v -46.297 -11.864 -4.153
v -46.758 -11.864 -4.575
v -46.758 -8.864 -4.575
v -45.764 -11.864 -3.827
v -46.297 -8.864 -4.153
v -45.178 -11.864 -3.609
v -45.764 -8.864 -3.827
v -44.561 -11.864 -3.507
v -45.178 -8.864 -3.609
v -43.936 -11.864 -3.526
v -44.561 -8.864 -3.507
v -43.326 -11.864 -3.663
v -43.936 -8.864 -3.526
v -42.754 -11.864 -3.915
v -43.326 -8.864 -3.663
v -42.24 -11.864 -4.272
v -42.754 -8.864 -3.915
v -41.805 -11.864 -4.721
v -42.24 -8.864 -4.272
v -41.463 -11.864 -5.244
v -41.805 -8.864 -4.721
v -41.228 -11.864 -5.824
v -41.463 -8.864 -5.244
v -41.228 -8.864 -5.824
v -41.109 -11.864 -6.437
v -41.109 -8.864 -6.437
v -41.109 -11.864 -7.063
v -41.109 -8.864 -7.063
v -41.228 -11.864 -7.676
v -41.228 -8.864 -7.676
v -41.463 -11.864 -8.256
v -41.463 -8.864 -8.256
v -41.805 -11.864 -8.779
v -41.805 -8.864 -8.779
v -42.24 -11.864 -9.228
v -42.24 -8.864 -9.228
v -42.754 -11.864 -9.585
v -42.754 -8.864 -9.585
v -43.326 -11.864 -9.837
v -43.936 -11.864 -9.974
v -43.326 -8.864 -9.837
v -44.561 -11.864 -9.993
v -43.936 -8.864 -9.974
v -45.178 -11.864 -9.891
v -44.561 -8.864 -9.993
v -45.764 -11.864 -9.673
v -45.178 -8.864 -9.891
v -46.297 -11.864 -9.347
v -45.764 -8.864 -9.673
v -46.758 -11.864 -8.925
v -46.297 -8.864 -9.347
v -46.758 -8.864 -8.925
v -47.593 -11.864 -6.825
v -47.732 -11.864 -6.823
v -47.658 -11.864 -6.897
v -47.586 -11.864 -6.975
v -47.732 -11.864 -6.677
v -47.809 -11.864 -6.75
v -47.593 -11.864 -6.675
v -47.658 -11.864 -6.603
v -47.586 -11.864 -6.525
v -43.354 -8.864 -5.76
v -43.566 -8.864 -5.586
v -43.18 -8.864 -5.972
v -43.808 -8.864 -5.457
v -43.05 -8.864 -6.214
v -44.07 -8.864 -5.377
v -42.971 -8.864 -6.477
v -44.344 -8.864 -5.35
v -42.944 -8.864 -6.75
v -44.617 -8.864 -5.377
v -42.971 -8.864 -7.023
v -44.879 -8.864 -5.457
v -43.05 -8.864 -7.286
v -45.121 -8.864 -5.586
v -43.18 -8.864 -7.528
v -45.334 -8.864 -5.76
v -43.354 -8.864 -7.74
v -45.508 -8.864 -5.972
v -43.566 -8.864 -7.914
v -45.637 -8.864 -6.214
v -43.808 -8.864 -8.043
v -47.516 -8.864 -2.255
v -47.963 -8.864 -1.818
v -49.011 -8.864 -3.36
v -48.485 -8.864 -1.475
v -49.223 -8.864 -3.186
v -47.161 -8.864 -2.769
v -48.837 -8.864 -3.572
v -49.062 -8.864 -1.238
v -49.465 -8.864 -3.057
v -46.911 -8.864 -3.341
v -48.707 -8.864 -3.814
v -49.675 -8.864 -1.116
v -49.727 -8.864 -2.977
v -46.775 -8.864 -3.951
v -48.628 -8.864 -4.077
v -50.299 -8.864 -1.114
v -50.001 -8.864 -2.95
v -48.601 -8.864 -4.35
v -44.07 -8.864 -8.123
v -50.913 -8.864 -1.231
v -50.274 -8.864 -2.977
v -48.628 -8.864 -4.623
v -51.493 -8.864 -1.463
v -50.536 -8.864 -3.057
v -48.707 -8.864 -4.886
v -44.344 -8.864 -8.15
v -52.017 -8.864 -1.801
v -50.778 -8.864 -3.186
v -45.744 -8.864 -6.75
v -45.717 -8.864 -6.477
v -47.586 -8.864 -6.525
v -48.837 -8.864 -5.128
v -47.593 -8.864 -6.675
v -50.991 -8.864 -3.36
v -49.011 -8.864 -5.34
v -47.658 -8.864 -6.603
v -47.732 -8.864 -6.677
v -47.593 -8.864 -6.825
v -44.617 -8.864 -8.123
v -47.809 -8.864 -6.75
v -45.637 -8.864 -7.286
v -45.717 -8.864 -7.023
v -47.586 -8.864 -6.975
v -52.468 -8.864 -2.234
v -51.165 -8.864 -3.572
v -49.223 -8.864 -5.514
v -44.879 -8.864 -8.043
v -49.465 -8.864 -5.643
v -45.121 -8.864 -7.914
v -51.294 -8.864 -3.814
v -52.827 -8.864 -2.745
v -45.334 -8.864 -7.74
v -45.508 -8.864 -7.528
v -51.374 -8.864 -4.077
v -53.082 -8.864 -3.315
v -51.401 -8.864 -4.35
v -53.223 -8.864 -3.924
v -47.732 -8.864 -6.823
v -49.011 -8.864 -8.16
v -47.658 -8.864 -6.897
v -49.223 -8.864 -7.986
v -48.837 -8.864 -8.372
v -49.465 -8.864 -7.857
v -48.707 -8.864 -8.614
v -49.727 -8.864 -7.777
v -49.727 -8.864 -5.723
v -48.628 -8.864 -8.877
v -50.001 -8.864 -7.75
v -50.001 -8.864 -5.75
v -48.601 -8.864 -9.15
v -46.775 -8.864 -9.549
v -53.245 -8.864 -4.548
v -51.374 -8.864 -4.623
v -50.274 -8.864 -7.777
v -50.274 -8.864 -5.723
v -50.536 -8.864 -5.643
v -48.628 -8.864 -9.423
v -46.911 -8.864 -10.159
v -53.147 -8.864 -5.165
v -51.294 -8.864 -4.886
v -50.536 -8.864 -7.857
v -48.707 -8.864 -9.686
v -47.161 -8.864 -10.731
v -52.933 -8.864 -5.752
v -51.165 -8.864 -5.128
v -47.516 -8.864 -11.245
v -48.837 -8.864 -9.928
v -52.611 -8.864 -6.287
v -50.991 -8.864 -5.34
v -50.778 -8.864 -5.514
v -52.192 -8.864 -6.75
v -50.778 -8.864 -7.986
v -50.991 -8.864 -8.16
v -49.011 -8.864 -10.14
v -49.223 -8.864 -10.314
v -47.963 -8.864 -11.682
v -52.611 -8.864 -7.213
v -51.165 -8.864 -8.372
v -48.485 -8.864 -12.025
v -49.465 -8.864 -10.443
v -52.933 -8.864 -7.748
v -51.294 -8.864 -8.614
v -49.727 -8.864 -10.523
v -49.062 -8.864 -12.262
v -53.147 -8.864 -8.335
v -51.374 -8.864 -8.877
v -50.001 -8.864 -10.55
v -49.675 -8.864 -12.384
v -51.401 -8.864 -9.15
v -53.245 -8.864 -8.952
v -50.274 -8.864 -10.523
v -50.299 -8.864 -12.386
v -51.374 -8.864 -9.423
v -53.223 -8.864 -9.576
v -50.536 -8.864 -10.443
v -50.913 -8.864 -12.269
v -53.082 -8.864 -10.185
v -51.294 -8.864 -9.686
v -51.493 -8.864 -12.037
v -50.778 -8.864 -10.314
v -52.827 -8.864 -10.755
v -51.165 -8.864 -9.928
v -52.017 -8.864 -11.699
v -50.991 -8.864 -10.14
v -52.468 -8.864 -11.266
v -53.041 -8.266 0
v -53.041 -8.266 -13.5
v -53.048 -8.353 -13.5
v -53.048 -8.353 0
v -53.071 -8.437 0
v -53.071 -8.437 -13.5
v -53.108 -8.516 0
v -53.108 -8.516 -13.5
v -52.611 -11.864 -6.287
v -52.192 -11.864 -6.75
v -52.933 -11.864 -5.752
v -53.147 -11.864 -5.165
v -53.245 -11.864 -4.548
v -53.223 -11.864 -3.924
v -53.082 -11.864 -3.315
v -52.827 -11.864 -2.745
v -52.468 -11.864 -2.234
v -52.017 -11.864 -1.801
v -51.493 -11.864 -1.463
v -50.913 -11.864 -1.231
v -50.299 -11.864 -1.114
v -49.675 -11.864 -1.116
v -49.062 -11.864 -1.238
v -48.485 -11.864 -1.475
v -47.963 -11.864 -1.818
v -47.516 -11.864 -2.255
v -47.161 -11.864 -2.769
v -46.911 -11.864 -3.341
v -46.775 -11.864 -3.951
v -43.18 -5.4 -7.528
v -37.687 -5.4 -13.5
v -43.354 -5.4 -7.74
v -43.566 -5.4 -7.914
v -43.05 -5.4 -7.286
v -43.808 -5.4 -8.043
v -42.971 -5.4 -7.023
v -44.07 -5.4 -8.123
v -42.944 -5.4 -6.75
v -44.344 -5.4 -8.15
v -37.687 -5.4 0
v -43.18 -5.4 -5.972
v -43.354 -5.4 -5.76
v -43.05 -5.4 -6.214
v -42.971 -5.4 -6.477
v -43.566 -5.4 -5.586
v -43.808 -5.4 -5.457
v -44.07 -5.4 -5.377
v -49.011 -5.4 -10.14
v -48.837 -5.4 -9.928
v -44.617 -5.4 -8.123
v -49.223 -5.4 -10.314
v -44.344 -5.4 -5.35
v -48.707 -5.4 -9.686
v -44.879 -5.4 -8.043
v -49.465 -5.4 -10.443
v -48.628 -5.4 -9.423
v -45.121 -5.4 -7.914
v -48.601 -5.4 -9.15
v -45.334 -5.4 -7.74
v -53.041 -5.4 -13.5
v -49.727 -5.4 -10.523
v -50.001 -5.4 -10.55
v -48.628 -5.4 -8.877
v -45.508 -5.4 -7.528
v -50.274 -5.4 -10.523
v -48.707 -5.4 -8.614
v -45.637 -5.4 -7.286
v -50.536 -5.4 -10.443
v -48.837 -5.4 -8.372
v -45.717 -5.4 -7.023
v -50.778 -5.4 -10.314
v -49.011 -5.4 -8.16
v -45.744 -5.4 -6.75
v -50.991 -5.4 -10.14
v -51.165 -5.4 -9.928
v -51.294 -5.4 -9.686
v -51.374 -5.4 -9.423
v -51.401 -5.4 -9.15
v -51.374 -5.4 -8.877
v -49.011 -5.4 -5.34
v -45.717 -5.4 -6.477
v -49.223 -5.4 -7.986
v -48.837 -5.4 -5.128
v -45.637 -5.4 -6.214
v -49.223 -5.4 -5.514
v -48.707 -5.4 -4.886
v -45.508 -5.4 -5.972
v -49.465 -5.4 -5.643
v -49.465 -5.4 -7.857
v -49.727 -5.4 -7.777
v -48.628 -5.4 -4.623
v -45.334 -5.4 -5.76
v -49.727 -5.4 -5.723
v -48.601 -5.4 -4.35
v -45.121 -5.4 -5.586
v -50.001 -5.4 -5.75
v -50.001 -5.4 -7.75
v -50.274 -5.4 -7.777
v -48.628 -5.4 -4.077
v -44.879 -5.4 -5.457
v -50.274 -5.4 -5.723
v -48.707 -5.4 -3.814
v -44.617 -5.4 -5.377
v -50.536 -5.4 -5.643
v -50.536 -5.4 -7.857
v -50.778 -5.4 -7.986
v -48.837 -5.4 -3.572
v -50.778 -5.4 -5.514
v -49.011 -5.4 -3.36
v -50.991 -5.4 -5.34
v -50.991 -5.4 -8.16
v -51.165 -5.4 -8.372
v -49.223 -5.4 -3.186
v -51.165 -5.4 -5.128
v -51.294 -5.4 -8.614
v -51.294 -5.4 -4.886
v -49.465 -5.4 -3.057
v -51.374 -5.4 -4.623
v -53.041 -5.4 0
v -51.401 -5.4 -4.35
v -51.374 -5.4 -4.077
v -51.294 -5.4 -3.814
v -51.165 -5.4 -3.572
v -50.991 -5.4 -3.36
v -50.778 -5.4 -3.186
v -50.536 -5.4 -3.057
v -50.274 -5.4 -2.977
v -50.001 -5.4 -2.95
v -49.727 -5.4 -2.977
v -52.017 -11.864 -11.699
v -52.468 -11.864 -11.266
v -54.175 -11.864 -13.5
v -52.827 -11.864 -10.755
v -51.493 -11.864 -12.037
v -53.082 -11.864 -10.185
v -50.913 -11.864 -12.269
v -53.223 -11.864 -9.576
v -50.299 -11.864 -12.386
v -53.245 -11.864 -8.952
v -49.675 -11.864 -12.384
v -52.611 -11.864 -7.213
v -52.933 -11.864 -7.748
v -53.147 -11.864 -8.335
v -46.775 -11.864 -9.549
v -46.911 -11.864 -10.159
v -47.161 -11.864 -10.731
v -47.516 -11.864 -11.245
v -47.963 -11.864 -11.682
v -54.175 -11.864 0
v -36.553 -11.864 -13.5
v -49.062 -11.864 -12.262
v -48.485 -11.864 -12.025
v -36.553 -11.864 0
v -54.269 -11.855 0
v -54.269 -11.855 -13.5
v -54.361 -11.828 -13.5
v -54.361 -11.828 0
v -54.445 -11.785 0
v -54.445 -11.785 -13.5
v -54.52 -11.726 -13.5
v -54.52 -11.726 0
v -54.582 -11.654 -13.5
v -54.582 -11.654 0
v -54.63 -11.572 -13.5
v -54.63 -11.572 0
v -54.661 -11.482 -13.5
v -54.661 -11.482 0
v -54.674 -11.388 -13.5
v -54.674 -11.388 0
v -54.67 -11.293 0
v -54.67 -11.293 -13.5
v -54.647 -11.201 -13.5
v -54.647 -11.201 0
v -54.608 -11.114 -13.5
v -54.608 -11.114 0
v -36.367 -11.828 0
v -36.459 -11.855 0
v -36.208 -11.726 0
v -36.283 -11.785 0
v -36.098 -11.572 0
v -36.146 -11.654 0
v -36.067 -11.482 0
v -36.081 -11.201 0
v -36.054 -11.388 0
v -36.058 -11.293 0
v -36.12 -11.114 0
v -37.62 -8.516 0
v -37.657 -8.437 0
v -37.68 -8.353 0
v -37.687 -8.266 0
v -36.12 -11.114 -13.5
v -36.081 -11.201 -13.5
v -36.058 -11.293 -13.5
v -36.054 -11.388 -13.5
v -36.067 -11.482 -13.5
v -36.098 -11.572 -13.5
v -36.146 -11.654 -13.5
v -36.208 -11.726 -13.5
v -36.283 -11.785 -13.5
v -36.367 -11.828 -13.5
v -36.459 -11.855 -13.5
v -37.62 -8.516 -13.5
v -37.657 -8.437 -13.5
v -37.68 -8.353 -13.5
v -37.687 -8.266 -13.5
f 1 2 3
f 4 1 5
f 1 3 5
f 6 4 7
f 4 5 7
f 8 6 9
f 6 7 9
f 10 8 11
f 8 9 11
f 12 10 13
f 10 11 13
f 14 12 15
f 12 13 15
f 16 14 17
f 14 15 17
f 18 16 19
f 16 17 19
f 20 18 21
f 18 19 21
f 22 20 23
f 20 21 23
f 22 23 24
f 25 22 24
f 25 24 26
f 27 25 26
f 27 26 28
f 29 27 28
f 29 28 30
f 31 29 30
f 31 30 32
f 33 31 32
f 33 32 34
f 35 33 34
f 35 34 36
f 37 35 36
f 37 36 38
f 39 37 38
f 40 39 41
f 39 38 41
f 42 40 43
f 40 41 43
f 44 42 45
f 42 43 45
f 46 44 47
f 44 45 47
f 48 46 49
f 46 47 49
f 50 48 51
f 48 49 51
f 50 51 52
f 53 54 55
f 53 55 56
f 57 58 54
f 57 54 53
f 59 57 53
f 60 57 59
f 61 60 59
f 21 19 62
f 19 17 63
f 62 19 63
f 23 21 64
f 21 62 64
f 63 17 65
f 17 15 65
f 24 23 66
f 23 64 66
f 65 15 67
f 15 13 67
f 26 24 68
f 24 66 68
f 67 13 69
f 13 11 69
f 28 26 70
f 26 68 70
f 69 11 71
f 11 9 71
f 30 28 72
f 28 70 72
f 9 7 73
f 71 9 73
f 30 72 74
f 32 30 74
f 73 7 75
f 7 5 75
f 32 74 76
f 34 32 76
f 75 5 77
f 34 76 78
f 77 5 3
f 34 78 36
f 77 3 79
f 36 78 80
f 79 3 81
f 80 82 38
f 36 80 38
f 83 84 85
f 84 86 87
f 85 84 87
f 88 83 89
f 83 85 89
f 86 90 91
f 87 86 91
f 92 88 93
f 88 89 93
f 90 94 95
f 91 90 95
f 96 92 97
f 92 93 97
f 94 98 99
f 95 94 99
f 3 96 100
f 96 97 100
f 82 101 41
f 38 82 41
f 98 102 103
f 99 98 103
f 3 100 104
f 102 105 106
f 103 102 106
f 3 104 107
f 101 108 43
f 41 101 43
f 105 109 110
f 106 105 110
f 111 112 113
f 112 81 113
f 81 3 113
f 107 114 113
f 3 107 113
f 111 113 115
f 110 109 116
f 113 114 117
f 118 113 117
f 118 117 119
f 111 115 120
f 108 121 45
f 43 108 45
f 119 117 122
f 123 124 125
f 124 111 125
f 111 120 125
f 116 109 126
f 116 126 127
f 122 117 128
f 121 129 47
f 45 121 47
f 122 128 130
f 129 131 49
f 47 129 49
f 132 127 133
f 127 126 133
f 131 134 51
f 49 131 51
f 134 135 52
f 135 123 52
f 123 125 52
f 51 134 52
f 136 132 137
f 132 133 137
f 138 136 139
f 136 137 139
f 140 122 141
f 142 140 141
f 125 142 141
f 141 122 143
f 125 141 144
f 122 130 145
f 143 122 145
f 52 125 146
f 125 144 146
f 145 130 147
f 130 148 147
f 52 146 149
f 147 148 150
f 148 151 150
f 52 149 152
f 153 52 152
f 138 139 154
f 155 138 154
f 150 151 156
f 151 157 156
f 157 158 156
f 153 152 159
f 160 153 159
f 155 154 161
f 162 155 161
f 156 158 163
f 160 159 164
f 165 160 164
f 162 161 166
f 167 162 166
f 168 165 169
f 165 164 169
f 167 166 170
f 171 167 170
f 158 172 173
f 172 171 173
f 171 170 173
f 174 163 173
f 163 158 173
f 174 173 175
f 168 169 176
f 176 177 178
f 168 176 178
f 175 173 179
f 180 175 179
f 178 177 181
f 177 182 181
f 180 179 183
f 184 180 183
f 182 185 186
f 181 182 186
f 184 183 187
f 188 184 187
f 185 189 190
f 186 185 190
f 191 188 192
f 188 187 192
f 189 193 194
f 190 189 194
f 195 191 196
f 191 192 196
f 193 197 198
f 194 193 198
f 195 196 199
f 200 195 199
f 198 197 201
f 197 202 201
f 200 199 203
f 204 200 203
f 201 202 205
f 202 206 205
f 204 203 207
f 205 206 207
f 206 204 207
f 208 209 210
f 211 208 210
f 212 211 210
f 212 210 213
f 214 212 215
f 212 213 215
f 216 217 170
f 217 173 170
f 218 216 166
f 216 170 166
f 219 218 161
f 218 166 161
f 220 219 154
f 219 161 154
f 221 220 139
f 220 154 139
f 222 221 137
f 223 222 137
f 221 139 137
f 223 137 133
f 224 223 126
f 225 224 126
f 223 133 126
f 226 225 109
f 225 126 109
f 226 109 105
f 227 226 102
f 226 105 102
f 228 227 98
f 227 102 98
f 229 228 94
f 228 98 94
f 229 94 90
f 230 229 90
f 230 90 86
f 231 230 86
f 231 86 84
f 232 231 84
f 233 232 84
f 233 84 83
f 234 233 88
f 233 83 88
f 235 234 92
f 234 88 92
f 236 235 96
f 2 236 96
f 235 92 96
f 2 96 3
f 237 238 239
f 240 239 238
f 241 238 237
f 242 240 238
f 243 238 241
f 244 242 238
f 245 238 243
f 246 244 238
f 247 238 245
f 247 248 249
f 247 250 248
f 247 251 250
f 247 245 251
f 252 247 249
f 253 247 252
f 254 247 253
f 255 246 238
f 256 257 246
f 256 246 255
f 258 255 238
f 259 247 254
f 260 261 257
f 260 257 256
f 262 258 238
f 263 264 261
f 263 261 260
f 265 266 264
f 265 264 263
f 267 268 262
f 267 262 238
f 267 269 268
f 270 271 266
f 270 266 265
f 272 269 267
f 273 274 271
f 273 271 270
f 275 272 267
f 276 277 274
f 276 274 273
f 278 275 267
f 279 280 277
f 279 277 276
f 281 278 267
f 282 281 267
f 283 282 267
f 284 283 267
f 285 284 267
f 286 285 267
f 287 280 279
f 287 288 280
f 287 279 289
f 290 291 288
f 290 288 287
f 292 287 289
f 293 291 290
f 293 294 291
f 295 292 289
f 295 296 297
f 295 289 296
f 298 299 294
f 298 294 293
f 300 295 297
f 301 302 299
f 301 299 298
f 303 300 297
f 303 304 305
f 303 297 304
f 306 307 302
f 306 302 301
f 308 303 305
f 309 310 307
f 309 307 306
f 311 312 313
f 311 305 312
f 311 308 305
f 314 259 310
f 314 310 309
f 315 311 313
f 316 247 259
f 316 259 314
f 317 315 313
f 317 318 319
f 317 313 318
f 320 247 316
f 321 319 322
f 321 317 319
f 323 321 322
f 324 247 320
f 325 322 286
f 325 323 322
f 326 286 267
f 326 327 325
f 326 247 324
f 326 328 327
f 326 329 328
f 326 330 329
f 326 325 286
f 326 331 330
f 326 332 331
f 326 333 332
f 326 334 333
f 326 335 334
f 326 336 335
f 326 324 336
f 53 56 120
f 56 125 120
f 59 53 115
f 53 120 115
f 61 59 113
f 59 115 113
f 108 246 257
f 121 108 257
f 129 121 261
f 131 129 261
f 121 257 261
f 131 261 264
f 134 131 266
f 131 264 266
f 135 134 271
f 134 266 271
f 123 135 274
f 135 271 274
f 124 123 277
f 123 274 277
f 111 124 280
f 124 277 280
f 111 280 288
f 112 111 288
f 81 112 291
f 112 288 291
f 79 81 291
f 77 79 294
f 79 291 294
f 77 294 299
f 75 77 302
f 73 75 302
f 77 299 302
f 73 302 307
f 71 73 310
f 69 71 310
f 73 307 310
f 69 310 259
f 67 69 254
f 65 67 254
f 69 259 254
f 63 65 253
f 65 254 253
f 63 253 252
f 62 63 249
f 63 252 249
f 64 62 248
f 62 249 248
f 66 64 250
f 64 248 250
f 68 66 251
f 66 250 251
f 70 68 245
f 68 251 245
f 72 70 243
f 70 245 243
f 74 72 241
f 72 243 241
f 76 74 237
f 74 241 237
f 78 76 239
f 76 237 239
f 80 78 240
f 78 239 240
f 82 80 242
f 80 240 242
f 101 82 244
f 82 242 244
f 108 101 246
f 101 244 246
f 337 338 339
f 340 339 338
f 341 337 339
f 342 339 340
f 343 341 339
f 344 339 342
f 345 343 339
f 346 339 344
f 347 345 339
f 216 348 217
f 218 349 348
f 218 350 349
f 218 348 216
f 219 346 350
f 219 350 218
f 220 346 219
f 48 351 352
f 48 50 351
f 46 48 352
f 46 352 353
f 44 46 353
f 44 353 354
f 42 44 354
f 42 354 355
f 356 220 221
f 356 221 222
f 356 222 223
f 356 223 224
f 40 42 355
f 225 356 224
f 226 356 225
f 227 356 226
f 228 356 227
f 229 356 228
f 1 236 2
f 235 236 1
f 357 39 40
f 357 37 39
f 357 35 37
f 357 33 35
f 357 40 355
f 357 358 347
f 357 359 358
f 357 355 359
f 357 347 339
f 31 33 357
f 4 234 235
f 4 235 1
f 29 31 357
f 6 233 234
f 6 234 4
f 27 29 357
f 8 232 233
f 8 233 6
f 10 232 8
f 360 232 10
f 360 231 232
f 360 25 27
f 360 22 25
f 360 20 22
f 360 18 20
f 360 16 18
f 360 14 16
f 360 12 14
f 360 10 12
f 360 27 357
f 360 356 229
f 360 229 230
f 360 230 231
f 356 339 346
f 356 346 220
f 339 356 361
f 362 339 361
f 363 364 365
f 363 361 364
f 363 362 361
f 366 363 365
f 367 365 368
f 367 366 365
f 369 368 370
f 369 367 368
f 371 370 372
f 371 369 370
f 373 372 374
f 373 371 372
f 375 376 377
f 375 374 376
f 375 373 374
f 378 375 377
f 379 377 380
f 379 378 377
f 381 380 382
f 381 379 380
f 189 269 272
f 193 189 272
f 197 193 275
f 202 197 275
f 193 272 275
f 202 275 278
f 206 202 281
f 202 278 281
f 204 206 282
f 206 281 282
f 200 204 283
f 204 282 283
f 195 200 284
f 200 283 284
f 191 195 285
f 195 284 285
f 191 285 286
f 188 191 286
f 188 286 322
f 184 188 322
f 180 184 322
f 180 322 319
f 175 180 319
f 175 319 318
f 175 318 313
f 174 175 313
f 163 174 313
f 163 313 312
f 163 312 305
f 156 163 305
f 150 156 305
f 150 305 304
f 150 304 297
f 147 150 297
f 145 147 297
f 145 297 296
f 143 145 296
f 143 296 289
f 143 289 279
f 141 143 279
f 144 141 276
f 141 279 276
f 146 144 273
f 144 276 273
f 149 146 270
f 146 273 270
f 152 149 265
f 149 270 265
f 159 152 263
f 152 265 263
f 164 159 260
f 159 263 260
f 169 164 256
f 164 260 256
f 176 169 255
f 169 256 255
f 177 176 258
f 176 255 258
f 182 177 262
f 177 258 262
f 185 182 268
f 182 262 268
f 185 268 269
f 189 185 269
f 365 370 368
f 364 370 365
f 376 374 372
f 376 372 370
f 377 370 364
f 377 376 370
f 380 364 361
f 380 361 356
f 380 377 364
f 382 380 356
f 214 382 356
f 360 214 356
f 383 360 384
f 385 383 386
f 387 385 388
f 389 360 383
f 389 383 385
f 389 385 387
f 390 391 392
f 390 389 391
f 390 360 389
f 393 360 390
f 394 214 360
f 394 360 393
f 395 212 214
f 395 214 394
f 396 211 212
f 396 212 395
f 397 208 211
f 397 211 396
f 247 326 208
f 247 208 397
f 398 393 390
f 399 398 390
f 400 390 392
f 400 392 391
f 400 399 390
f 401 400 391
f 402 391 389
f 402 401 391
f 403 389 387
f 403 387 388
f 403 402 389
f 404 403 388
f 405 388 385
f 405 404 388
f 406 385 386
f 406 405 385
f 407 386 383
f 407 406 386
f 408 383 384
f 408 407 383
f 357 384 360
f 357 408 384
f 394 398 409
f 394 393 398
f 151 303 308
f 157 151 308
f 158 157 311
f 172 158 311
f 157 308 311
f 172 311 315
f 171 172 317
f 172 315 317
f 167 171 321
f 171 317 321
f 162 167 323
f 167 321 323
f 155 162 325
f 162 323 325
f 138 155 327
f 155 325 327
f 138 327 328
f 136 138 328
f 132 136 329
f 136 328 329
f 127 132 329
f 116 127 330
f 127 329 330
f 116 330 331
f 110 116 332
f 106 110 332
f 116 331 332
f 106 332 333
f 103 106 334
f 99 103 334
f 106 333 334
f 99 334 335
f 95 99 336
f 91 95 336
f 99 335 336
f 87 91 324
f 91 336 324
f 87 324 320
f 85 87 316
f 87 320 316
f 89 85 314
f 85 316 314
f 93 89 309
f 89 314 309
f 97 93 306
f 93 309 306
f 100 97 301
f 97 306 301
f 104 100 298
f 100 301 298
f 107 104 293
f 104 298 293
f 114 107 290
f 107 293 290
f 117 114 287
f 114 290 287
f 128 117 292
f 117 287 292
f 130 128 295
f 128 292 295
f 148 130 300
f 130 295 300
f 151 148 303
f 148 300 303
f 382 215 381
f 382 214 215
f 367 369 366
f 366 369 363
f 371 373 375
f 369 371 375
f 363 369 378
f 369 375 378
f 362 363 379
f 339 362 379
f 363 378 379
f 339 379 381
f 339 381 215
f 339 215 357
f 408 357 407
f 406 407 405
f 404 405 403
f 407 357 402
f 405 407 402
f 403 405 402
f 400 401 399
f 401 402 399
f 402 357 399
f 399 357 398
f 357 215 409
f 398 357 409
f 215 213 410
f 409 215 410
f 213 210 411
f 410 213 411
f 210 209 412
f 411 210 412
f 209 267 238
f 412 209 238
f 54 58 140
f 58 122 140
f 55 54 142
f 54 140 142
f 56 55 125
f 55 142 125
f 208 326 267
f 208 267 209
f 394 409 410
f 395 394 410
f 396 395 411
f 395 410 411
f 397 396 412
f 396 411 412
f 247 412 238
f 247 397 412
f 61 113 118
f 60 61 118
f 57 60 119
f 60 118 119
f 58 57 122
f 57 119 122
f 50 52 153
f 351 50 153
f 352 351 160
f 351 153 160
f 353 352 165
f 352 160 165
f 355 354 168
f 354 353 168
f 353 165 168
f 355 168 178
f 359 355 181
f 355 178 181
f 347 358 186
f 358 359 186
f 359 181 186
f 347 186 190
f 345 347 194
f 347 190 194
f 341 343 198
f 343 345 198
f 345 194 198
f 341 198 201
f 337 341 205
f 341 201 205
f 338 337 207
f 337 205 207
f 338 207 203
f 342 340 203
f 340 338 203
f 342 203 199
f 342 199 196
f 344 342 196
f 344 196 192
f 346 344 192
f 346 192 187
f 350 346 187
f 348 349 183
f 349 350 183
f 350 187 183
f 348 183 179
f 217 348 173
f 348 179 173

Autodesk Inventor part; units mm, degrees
ref_plane "YZ Plane" through (0, 0, 0) normal (1, 0, 0) x (0, 1, 0)
ref_plane "XZ Plane" through (0, 0, 0) normal (0, 1, 0) x (-1, 0, 0)
ref_plane "Arbeitsebene1" through (0, 0, 0) normal (0, 0, 1) x (1, 0, 0)
sketch "Skizze1" plane through (0, 0, 0) normal (0, 0, 1) x (1, 0, 0)
  arc A0 (-53, 5.4) -> (-47.2, -0.4) centre (-47.2, 5.4) ccw projected
  line L0 (-53, -5.4) -> (-53, 5.4) projected
  line L1 (-35.6871, -5.4) -> (-53, -5.4) projected
  line L2 (-35.6871, -0.4) -> (-35.6871, -5.4) projected
  line L3 (-47.2, -0.4) -> (-35.6871, -0.4) projected
  line L4 (-67.0006, -5.9) -> (-67.0006, -9.9) projected
  line L5 (-31.7506, -5.4) -> (-31.7506, -10.4) projected
  line L6 (-33.0006, -5.9) -> (-33.0006, -9.9) construction
  line L7 (-32.5561, -5.4) -> (-32.5561, -10.4) projected
  line L8 (-51.4006, -5.4) -> (-51.4006, 4.6)
  line L9 (-48.6006, -5.4) -> (-48.6006, 2.412)
  line L10 (-35.6871, -5.4) -> (-53.0408, -5.4)
  line L11 (-53.0408, -5.4) -> (-53.0408, -8.4)
  line L12 (-53.0408, -8.4) -> (-37.6871, -8.4)
  line L13 (-37.6871, -8.4) -> (-37.6871, -5.4)
  line L14 (-53.0408, -8.4) -> (-55.0408, -11.8641)
  line L15 (-53.0408, -8.4) -> (-49.0408, -8.4) construction
  line L16 (-55.0408, -11.8641) -> (-35.6871, -11.8641)
  line L17 (-35.6871, -11.8641) -> (-37.6871, -8.4)
  point P0 (0, 0)
  dimension "d0" = 3
  dimension "d1" = 4
  dimension "d2" = 120
  dimension "d3" = 60
  dimension "d14" = 2
ref_plane "Arbeitsebene2" through (-53, -5.4, -13.5) normal (0, 0, -1) x (0, 1, 0)
extrude "Extrusion1" add sketch "Skizze1" against normal up to surface (13.5 mm away) contours L1 L13 L12 L11 L10 | L12 L17 L16 L14
fillet "Rundung1" radius 0.5 4 edges at (-55.0408, -11.8641, -6.75) (-35.6871, -11.8641, -6.75) (-53.0408, -8.4, -6.75) (-37.6871, -8.4, -6.75)
sketch "Skizze2" plane through (-54.1748, -11.8641, 0) normal (0, -1, 0) x (1, 0, 0)
  circle A0 centre (9.8312, -6.75) radius 1.4 projected
  circle A1 centre (4.1742, -4.35) radius 1.4 projected
  line L0 (-0.6431, -6.75) -> (20.1351, -6.75)
  circle A2 centre (4.1742, -9.15) radius 1.4
  point P0 (54.1748, 0)
hole "Bohrung1" at (-50.0006, -11.8641, -4.35) at (-44.3436, -11.8641, -6.75) at (-50.0006, -11.8641, -9.15) direction (0, 1, 0) diameter 2.8 depth 14 tip angle 118 counterbore diameter 6.5 counterbore depth 3
properties part number "10_Cassete_Slide"
